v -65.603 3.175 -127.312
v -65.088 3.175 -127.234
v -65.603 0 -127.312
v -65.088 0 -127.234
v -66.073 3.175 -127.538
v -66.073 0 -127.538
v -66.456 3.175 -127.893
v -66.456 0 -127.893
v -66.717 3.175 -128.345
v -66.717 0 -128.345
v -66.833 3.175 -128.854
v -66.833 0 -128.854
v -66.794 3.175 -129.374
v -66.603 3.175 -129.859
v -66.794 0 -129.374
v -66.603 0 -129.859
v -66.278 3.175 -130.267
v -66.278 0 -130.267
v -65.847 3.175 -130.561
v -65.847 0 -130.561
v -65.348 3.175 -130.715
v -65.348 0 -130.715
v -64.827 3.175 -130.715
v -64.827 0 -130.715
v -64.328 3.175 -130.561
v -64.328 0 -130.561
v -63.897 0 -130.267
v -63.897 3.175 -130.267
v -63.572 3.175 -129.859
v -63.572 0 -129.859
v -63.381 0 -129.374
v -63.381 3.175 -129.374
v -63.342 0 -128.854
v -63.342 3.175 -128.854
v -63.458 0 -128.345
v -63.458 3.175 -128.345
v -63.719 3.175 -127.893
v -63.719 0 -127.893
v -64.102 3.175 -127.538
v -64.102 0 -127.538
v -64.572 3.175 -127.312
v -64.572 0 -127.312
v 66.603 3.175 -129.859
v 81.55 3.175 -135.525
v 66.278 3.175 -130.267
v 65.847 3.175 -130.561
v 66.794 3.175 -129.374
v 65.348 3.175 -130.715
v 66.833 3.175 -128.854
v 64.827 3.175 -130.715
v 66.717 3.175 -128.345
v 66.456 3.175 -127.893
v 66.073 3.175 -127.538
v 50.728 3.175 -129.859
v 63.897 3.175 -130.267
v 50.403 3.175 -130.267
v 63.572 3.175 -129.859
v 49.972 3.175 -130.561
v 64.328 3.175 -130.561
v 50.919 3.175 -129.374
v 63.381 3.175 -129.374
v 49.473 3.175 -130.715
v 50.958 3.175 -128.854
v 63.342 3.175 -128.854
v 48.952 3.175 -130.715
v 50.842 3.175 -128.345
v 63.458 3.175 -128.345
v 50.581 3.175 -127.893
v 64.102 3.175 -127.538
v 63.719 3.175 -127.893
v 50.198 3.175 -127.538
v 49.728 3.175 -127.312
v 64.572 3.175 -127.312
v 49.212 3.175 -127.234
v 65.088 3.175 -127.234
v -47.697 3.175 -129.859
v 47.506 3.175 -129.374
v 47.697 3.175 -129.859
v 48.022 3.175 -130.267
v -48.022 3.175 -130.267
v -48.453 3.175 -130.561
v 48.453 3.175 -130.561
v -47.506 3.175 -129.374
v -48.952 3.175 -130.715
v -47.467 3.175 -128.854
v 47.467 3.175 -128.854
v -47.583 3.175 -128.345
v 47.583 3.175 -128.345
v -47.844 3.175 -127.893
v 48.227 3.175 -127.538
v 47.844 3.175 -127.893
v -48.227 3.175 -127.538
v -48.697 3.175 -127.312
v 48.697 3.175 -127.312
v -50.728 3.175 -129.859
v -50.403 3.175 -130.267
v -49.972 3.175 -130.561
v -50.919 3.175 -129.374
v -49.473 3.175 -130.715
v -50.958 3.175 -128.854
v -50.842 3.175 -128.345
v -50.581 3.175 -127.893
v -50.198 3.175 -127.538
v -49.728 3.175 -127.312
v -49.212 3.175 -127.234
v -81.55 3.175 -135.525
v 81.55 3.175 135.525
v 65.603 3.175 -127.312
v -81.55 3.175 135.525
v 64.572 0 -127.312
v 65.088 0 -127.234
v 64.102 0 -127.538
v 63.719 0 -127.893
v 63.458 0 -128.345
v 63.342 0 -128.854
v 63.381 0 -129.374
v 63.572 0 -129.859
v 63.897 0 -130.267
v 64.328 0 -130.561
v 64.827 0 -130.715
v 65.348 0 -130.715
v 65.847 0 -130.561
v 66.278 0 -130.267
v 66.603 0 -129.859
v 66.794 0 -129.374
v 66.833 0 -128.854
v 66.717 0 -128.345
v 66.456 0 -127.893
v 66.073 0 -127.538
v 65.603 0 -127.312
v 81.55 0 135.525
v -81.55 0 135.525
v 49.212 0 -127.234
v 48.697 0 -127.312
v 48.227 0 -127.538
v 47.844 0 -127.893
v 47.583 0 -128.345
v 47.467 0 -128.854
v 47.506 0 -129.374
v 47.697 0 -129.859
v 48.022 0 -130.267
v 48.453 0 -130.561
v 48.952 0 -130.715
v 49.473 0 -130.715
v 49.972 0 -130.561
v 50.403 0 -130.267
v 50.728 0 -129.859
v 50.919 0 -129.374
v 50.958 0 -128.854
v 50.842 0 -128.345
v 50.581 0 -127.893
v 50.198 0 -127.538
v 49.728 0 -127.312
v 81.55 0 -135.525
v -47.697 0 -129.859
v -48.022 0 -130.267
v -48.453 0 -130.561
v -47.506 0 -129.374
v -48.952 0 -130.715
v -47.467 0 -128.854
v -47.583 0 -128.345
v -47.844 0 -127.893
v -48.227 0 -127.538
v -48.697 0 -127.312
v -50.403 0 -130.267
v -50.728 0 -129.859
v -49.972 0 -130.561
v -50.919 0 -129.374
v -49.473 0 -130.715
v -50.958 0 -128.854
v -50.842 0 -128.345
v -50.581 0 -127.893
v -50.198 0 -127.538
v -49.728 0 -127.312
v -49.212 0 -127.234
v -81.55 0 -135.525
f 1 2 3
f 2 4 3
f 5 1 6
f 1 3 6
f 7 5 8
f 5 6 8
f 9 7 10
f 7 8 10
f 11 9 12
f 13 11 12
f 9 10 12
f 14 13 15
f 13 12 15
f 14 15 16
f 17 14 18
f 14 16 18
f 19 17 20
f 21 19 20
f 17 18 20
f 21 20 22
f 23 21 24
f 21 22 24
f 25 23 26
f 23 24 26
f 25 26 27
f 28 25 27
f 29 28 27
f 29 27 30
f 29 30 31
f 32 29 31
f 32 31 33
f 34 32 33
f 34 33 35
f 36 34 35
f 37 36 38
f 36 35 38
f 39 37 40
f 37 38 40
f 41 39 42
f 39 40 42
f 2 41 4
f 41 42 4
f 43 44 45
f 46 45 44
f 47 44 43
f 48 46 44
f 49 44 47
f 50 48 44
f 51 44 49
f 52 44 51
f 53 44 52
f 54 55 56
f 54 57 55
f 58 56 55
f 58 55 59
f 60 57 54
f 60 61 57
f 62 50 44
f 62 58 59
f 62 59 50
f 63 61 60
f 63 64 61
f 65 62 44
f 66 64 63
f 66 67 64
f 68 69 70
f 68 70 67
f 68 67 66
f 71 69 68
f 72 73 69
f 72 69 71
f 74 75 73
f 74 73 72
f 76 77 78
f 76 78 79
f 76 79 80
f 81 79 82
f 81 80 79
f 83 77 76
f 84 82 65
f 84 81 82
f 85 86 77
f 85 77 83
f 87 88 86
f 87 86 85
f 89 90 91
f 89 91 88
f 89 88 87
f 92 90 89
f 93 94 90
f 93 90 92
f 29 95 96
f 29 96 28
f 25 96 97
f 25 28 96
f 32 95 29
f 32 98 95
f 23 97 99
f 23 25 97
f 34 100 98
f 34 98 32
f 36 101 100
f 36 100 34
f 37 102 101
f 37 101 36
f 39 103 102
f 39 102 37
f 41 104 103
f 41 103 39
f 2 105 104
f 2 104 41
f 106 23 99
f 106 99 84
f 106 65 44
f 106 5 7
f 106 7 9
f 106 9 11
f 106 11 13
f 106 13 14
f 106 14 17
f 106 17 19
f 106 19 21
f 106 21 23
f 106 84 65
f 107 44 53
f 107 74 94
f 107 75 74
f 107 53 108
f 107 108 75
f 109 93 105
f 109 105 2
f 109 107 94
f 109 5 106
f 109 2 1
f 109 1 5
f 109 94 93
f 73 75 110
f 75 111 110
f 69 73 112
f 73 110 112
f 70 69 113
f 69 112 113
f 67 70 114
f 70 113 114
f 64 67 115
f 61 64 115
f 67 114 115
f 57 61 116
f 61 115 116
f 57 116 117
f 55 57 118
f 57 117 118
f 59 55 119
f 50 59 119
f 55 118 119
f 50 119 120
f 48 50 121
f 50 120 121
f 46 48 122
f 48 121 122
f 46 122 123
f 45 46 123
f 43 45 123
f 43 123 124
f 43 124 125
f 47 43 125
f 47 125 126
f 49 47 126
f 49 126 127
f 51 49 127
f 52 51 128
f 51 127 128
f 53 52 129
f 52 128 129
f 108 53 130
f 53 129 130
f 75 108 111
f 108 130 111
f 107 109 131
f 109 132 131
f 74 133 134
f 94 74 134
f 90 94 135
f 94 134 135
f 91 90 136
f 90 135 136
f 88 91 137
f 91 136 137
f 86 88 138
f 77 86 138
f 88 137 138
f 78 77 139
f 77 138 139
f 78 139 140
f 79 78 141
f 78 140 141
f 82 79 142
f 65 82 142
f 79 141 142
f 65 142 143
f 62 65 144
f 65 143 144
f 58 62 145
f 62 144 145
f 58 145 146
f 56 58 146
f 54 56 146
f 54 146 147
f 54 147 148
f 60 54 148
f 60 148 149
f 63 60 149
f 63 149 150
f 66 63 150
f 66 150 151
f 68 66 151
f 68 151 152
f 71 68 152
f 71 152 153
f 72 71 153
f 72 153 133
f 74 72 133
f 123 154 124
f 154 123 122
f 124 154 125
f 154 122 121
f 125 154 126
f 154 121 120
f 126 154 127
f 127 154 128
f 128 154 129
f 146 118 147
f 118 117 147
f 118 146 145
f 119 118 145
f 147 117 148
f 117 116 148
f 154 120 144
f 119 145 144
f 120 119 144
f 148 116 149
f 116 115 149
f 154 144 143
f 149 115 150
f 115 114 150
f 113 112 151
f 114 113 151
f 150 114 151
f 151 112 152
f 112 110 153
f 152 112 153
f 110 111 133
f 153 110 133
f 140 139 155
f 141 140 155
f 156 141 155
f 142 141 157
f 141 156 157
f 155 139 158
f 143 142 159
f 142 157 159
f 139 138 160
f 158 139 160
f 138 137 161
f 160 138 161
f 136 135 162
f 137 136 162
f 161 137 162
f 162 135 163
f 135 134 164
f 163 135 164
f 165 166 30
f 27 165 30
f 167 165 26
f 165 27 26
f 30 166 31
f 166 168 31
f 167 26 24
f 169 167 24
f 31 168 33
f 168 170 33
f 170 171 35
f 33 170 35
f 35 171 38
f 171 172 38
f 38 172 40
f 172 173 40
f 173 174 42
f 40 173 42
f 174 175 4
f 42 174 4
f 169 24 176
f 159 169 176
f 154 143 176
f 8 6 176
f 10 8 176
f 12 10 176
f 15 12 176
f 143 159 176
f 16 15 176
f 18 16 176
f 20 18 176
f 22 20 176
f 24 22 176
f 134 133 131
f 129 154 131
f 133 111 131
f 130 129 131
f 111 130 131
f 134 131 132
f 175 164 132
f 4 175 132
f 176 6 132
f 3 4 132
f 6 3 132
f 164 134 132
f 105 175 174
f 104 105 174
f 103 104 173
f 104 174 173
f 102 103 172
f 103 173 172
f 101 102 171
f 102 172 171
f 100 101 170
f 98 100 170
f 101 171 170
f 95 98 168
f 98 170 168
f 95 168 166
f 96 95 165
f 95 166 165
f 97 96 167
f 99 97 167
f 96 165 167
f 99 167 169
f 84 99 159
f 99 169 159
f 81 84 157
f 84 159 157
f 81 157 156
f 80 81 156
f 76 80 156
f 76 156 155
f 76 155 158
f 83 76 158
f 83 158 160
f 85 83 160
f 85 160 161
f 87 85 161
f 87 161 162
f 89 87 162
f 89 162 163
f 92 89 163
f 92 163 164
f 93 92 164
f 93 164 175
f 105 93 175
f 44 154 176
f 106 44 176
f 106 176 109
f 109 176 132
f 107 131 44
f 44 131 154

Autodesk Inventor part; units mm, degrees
ref_plane "YZ Plane" through (0, 0, 0) normal (1, 0, 0) x (0, 1, 0)
ref_plane "XZ Plane" through (0, 0, 0) normal (0, 1, 0) x (-1, 0, 0)
ref_plane "XY Plane" through (0, 0, 0) normal (0, 0, 1) x (1, 0, 0)
sketch "Sketch1" plane through (0, 0, 0) normal (0, 1, 0) x (-1, 0, 0)
  line L0 (81.55, 135.525) -> (-81.55, 135.525)
  line L1 (-81.55, 135.525) -> (-81.55, -135.525)
  line L2 (-81.55, -135.525) -> (81.55, -135.525)
  line L3 (81.55, -135.525) -> (81.55, 135.525)
  line L4 (81.55, 135.525) -> (-81.55, -135.525) construction
  line L5 (-81.55, 135.525) -> (81.55, -135.525) construction
  point P0 (0, 0)
  dimension "d0" = 163.1
  dimension "d1" = 271.05
extrude "Extrusion1" add sketch "Sketch1" along normal blind 3.175
sketch "Sketch2" plane through (0, 3.175, 0) normal (0, 1, 0) x (1, 0, 0)
  line L0 (81.55, 135.525) -> (-81.55, 135.525) projected
  line L1 (-81.55, 135.525) -> (-81.55, -135.525) projected
  line L2 (-81.55, -135.525) -> (81.55, -135.525) projected
  line L3 (81.55, -135.525) -> (81.55, 135.525) projected
  line L4 (-49.1236, 135.0962) -> (-54.7878, 135.0962) projected
  line L5 (-54.7878, 135.0962) -> (-54.7878, 136.525) projected
  line L6 (-59.5122, 136.525) -> (-54.7878, 136.525) projected
  line L7 (-59.5122, 136.525) -> (-59.5122, 135.0962) projected
  line L8 (-59.5122, 135.0962) -> (-65.1764, 135.0962) projected
  line L9 (-65.1764, 135.0962) -> (-65.1764, 136.525) projected
  line L10 (-69.85, 136.525) -> (-65.1764, 136.525) projected
  line L11 (-69.85, 123.825) -> (-69.85, 136.525) projected
  line L12 (-69.85, 123.825) -> (-44.45, 123.825) projected
  line L13 (-44.45, 123.825) -> (-44.45, 136.525) projected
  line L14 (-49.1236, 136.525) -> (-44.45, 136.525) projected
  line L15 (-49.1236, 136.525) -> (-49.1236, 135.0962) projected
  circle A0 centre (-49.2125, 128.9844) radius 2.0955 projected
  circle A1 centre (-65.0875, 128.9844) radius 2.0955 projected
  line L16 (65.1764, 135.0962) -> (59.5122, 135.0962) projected
  line L17 (59.5122, 135.0962) -> (59.5122, 136.525) projected
  line L18 (54.7878, 136.525) -> (59.5122, 136.525) projected
  line L19 (54.7878, 136.525) -> (54.7878, 135.0962) projected
  line L20 (54.7878, 135.0962) -> (49.1236, 135.0962) projected
  line L21 (49.1236, 135.0962) -> (49.1236, 136.525) projected
  line L22 (44.45, 136.525) -> (49.1236, 136.525) projected
  line L23 (44.45, 123.825) -> (44.45, 136.525) projected
  line L24 (44.45, 123.825) -> (69.85, 123.825) projected
  line L25 (69.85, 123.825) -> (69.85, 136.525) projected
  line L26 (65.1764, 136.525) -> (69.85, 136.525) projected
  line L27 (65.1764, 136.525) -> (65.1764, 135.0962) projected
  circle A2 centre (65.0875, 128.9844) radius 2.0955 projected
  circle A3 centre (49.2125, 128.9844) radius 2.0955 projected
  point P0 (0, 0)
hole "Hole1" at (-49.2125, 3.175, -128.9844) at (-65.0875, 3.175, -128.9844) at (49.2125, 3.175, -128.9844) at (65.0875, 3.175, -128.9844) direction (0, -1, 0) diameter 3.5 end through all
properties part number "NASA-20-EBOX-LID-01" material "Polycarbonate, Smoke"
